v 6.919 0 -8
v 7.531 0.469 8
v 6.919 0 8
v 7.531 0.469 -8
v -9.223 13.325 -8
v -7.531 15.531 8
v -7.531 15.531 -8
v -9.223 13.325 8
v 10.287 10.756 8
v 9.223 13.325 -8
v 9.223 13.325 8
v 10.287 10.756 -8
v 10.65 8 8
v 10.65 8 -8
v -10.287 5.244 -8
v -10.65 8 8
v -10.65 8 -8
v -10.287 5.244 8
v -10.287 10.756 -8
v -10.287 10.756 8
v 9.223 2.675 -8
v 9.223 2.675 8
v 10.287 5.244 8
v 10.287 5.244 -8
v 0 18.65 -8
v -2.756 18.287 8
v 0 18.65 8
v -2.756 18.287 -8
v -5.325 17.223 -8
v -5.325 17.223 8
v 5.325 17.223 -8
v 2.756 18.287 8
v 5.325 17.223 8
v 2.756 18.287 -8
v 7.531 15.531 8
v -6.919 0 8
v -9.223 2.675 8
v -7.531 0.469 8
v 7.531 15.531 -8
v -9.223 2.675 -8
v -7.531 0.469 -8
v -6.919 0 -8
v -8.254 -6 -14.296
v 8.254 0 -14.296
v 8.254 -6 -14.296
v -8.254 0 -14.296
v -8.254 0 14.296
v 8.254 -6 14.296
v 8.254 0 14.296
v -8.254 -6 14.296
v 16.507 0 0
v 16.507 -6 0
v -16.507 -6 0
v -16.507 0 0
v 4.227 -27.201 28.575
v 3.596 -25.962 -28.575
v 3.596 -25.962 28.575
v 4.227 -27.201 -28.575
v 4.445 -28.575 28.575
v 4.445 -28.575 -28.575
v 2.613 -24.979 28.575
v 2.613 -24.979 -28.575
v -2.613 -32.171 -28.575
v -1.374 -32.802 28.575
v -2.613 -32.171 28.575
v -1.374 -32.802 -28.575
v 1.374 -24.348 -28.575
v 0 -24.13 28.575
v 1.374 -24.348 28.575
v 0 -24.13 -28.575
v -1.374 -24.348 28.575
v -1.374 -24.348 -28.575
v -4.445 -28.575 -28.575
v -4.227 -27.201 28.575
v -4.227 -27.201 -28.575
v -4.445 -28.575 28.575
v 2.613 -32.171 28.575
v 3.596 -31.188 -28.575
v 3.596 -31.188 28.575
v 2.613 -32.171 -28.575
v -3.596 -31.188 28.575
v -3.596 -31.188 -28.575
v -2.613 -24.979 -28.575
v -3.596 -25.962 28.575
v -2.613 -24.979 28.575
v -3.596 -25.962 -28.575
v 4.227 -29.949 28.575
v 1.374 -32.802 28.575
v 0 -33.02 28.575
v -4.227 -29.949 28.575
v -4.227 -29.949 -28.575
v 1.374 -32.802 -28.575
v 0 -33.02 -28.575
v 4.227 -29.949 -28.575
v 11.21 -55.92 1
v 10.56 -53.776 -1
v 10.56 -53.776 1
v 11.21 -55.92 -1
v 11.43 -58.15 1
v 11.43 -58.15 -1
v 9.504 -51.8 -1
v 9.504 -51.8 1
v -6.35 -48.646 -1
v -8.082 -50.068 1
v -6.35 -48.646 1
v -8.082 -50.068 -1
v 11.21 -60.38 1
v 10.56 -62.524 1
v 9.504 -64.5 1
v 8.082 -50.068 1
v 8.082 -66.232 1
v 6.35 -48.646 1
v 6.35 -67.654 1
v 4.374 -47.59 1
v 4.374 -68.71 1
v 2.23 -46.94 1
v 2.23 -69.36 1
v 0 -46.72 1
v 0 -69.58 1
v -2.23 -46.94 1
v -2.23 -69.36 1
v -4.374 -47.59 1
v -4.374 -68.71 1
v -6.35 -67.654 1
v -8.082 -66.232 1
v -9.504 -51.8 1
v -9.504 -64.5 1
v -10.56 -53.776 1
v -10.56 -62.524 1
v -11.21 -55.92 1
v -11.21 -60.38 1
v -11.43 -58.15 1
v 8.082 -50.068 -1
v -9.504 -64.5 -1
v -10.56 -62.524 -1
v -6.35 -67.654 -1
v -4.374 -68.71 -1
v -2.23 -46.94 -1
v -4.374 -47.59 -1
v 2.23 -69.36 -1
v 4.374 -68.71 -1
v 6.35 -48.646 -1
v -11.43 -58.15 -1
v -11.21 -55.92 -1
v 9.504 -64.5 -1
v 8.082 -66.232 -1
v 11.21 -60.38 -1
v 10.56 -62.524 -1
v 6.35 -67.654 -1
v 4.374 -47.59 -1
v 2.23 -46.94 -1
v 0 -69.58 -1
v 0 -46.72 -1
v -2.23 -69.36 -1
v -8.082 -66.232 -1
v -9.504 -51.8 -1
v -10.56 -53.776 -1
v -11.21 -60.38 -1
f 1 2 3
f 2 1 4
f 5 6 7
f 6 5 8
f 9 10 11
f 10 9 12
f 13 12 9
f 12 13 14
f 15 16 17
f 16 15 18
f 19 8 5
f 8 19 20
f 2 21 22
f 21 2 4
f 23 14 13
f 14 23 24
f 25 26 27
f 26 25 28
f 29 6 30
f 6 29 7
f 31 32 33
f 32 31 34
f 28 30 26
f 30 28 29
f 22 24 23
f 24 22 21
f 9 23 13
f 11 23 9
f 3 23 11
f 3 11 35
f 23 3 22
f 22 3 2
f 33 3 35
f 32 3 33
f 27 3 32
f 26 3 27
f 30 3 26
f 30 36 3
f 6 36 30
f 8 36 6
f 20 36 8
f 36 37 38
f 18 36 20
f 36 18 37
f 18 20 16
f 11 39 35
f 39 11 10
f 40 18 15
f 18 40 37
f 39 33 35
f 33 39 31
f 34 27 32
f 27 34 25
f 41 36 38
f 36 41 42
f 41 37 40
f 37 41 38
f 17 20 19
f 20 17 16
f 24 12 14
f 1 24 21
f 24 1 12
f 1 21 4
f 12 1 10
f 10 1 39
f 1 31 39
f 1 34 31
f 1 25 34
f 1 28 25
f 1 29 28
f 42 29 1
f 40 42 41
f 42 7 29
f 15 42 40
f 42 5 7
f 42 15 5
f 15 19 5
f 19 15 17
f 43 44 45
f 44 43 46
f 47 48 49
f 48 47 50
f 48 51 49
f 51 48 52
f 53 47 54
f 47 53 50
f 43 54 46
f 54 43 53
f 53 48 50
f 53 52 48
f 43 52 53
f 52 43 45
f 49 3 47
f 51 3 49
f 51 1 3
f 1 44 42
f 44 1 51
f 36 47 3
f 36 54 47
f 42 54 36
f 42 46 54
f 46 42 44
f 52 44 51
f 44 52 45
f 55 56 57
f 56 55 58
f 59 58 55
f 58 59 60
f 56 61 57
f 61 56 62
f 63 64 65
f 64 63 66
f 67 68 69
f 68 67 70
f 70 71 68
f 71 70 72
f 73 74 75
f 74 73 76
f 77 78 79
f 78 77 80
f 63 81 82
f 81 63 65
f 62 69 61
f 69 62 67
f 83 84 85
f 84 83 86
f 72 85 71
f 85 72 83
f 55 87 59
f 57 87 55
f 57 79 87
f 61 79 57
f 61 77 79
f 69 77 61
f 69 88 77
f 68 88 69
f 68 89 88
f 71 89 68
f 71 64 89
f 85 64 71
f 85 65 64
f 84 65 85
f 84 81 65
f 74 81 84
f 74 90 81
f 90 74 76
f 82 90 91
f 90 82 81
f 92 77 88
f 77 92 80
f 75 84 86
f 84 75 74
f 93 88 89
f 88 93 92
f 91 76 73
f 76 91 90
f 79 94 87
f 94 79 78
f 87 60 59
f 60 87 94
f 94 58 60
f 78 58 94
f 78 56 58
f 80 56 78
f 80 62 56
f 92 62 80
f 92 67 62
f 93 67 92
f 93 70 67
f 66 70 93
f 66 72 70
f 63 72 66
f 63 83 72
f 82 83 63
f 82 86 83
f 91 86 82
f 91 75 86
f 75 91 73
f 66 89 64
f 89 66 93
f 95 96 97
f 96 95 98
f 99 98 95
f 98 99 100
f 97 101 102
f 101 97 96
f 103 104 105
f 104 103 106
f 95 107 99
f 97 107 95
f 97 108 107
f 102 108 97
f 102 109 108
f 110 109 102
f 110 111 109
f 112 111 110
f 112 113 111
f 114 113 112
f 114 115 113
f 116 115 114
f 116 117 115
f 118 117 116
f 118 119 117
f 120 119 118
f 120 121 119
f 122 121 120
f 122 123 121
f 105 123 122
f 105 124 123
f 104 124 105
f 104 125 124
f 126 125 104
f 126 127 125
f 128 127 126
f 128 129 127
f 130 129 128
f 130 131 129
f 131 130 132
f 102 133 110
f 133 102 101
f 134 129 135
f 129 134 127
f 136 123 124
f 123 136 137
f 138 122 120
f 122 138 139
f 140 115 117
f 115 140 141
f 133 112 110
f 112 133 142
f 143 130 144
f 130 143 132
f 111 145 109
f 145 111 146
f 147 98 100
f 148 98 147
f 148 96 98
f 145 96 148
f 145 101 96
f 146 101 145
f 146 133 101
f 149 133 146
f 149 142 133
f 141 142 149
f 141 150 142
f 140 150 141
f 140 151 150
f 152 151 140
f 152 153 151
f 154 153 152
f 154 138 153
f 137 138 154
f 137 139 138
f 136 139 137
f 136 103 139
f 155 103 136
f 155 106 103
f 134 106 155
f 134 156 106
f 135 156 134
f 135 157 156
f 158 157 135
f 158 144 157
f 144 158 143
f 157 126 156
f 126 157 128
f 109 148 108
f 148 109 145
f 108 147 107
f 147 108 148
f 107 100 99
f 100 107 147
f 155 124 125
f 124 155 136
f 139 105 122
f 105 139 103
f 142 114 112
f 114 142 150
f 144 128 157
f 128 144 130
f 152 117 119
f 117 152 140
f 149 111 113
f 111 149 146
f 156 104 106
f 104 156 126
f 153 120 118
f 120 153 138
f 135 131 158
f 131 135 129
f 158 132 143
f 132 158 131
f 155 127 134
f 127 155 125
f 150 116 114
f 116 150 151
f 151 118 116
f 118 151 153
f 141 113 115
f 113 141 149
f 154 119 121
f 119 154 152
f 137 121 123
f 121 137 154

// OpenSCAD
// Auto-generated by scripts/author_from_manifest.py (Phase D.3).
// Source: data/phase_d_manifest.json (sku_intent='tyco-ty1234-qr-pendent-135f').
// Do not hand-edit — regenerate from the manifest.
//
// @part tyco_ty1234_qr_pendent_135f
// @kind sprinkler_head
// @category head.pendant.k56
// @display-name "Tyco TY1234 Quick-Response Pendent K5.6 135°F"
// @mfg tyco_fire_protection
// @mfg-pn TY1234
// @listing UL FM
// @hazard-classes LH OH1
// @price-usd 15.25
// @install-minutes 8
// @crew journeyman
// @k-factor 5.6
// @orientation pendant
// @response quick
// @temperature 135F
// @param size_in number default=0.5 label="Size" unit="in"
// @port inlet position=[0,0.014,0] direction=[0,1,0] style=NPT_threaded size_in=0.5 role=drop

size_in = 0.5;
k_factor = 5.6;

length_mm   = 57.15;
body_dia_mm = 25.40;
thread_od   = 21.3;
thread_len  = 16;
deflector_d = body_dia_mm * 0.9;

 union() {
    translate([0, thread_len/2, 0])
        cylinder(h = thread_len, d = thread_od, center = true, $fn = 24);
    translate([0, -3, 0])
        rotate([90, 0, 0])
        cylinder(h = 6, d = thread_od * 1.55, $fn = 6, center = true);
    translate([0, -length_mm/2, 0])
        cylinder(h = length_mm, d = body_dia_mm * 0.35, center = true, $fn = 20);
    translate([0, -length_mm - 1, 0])
        cylinder(h = 2, d = deflector_d, center = true, $fn = 32);
}
